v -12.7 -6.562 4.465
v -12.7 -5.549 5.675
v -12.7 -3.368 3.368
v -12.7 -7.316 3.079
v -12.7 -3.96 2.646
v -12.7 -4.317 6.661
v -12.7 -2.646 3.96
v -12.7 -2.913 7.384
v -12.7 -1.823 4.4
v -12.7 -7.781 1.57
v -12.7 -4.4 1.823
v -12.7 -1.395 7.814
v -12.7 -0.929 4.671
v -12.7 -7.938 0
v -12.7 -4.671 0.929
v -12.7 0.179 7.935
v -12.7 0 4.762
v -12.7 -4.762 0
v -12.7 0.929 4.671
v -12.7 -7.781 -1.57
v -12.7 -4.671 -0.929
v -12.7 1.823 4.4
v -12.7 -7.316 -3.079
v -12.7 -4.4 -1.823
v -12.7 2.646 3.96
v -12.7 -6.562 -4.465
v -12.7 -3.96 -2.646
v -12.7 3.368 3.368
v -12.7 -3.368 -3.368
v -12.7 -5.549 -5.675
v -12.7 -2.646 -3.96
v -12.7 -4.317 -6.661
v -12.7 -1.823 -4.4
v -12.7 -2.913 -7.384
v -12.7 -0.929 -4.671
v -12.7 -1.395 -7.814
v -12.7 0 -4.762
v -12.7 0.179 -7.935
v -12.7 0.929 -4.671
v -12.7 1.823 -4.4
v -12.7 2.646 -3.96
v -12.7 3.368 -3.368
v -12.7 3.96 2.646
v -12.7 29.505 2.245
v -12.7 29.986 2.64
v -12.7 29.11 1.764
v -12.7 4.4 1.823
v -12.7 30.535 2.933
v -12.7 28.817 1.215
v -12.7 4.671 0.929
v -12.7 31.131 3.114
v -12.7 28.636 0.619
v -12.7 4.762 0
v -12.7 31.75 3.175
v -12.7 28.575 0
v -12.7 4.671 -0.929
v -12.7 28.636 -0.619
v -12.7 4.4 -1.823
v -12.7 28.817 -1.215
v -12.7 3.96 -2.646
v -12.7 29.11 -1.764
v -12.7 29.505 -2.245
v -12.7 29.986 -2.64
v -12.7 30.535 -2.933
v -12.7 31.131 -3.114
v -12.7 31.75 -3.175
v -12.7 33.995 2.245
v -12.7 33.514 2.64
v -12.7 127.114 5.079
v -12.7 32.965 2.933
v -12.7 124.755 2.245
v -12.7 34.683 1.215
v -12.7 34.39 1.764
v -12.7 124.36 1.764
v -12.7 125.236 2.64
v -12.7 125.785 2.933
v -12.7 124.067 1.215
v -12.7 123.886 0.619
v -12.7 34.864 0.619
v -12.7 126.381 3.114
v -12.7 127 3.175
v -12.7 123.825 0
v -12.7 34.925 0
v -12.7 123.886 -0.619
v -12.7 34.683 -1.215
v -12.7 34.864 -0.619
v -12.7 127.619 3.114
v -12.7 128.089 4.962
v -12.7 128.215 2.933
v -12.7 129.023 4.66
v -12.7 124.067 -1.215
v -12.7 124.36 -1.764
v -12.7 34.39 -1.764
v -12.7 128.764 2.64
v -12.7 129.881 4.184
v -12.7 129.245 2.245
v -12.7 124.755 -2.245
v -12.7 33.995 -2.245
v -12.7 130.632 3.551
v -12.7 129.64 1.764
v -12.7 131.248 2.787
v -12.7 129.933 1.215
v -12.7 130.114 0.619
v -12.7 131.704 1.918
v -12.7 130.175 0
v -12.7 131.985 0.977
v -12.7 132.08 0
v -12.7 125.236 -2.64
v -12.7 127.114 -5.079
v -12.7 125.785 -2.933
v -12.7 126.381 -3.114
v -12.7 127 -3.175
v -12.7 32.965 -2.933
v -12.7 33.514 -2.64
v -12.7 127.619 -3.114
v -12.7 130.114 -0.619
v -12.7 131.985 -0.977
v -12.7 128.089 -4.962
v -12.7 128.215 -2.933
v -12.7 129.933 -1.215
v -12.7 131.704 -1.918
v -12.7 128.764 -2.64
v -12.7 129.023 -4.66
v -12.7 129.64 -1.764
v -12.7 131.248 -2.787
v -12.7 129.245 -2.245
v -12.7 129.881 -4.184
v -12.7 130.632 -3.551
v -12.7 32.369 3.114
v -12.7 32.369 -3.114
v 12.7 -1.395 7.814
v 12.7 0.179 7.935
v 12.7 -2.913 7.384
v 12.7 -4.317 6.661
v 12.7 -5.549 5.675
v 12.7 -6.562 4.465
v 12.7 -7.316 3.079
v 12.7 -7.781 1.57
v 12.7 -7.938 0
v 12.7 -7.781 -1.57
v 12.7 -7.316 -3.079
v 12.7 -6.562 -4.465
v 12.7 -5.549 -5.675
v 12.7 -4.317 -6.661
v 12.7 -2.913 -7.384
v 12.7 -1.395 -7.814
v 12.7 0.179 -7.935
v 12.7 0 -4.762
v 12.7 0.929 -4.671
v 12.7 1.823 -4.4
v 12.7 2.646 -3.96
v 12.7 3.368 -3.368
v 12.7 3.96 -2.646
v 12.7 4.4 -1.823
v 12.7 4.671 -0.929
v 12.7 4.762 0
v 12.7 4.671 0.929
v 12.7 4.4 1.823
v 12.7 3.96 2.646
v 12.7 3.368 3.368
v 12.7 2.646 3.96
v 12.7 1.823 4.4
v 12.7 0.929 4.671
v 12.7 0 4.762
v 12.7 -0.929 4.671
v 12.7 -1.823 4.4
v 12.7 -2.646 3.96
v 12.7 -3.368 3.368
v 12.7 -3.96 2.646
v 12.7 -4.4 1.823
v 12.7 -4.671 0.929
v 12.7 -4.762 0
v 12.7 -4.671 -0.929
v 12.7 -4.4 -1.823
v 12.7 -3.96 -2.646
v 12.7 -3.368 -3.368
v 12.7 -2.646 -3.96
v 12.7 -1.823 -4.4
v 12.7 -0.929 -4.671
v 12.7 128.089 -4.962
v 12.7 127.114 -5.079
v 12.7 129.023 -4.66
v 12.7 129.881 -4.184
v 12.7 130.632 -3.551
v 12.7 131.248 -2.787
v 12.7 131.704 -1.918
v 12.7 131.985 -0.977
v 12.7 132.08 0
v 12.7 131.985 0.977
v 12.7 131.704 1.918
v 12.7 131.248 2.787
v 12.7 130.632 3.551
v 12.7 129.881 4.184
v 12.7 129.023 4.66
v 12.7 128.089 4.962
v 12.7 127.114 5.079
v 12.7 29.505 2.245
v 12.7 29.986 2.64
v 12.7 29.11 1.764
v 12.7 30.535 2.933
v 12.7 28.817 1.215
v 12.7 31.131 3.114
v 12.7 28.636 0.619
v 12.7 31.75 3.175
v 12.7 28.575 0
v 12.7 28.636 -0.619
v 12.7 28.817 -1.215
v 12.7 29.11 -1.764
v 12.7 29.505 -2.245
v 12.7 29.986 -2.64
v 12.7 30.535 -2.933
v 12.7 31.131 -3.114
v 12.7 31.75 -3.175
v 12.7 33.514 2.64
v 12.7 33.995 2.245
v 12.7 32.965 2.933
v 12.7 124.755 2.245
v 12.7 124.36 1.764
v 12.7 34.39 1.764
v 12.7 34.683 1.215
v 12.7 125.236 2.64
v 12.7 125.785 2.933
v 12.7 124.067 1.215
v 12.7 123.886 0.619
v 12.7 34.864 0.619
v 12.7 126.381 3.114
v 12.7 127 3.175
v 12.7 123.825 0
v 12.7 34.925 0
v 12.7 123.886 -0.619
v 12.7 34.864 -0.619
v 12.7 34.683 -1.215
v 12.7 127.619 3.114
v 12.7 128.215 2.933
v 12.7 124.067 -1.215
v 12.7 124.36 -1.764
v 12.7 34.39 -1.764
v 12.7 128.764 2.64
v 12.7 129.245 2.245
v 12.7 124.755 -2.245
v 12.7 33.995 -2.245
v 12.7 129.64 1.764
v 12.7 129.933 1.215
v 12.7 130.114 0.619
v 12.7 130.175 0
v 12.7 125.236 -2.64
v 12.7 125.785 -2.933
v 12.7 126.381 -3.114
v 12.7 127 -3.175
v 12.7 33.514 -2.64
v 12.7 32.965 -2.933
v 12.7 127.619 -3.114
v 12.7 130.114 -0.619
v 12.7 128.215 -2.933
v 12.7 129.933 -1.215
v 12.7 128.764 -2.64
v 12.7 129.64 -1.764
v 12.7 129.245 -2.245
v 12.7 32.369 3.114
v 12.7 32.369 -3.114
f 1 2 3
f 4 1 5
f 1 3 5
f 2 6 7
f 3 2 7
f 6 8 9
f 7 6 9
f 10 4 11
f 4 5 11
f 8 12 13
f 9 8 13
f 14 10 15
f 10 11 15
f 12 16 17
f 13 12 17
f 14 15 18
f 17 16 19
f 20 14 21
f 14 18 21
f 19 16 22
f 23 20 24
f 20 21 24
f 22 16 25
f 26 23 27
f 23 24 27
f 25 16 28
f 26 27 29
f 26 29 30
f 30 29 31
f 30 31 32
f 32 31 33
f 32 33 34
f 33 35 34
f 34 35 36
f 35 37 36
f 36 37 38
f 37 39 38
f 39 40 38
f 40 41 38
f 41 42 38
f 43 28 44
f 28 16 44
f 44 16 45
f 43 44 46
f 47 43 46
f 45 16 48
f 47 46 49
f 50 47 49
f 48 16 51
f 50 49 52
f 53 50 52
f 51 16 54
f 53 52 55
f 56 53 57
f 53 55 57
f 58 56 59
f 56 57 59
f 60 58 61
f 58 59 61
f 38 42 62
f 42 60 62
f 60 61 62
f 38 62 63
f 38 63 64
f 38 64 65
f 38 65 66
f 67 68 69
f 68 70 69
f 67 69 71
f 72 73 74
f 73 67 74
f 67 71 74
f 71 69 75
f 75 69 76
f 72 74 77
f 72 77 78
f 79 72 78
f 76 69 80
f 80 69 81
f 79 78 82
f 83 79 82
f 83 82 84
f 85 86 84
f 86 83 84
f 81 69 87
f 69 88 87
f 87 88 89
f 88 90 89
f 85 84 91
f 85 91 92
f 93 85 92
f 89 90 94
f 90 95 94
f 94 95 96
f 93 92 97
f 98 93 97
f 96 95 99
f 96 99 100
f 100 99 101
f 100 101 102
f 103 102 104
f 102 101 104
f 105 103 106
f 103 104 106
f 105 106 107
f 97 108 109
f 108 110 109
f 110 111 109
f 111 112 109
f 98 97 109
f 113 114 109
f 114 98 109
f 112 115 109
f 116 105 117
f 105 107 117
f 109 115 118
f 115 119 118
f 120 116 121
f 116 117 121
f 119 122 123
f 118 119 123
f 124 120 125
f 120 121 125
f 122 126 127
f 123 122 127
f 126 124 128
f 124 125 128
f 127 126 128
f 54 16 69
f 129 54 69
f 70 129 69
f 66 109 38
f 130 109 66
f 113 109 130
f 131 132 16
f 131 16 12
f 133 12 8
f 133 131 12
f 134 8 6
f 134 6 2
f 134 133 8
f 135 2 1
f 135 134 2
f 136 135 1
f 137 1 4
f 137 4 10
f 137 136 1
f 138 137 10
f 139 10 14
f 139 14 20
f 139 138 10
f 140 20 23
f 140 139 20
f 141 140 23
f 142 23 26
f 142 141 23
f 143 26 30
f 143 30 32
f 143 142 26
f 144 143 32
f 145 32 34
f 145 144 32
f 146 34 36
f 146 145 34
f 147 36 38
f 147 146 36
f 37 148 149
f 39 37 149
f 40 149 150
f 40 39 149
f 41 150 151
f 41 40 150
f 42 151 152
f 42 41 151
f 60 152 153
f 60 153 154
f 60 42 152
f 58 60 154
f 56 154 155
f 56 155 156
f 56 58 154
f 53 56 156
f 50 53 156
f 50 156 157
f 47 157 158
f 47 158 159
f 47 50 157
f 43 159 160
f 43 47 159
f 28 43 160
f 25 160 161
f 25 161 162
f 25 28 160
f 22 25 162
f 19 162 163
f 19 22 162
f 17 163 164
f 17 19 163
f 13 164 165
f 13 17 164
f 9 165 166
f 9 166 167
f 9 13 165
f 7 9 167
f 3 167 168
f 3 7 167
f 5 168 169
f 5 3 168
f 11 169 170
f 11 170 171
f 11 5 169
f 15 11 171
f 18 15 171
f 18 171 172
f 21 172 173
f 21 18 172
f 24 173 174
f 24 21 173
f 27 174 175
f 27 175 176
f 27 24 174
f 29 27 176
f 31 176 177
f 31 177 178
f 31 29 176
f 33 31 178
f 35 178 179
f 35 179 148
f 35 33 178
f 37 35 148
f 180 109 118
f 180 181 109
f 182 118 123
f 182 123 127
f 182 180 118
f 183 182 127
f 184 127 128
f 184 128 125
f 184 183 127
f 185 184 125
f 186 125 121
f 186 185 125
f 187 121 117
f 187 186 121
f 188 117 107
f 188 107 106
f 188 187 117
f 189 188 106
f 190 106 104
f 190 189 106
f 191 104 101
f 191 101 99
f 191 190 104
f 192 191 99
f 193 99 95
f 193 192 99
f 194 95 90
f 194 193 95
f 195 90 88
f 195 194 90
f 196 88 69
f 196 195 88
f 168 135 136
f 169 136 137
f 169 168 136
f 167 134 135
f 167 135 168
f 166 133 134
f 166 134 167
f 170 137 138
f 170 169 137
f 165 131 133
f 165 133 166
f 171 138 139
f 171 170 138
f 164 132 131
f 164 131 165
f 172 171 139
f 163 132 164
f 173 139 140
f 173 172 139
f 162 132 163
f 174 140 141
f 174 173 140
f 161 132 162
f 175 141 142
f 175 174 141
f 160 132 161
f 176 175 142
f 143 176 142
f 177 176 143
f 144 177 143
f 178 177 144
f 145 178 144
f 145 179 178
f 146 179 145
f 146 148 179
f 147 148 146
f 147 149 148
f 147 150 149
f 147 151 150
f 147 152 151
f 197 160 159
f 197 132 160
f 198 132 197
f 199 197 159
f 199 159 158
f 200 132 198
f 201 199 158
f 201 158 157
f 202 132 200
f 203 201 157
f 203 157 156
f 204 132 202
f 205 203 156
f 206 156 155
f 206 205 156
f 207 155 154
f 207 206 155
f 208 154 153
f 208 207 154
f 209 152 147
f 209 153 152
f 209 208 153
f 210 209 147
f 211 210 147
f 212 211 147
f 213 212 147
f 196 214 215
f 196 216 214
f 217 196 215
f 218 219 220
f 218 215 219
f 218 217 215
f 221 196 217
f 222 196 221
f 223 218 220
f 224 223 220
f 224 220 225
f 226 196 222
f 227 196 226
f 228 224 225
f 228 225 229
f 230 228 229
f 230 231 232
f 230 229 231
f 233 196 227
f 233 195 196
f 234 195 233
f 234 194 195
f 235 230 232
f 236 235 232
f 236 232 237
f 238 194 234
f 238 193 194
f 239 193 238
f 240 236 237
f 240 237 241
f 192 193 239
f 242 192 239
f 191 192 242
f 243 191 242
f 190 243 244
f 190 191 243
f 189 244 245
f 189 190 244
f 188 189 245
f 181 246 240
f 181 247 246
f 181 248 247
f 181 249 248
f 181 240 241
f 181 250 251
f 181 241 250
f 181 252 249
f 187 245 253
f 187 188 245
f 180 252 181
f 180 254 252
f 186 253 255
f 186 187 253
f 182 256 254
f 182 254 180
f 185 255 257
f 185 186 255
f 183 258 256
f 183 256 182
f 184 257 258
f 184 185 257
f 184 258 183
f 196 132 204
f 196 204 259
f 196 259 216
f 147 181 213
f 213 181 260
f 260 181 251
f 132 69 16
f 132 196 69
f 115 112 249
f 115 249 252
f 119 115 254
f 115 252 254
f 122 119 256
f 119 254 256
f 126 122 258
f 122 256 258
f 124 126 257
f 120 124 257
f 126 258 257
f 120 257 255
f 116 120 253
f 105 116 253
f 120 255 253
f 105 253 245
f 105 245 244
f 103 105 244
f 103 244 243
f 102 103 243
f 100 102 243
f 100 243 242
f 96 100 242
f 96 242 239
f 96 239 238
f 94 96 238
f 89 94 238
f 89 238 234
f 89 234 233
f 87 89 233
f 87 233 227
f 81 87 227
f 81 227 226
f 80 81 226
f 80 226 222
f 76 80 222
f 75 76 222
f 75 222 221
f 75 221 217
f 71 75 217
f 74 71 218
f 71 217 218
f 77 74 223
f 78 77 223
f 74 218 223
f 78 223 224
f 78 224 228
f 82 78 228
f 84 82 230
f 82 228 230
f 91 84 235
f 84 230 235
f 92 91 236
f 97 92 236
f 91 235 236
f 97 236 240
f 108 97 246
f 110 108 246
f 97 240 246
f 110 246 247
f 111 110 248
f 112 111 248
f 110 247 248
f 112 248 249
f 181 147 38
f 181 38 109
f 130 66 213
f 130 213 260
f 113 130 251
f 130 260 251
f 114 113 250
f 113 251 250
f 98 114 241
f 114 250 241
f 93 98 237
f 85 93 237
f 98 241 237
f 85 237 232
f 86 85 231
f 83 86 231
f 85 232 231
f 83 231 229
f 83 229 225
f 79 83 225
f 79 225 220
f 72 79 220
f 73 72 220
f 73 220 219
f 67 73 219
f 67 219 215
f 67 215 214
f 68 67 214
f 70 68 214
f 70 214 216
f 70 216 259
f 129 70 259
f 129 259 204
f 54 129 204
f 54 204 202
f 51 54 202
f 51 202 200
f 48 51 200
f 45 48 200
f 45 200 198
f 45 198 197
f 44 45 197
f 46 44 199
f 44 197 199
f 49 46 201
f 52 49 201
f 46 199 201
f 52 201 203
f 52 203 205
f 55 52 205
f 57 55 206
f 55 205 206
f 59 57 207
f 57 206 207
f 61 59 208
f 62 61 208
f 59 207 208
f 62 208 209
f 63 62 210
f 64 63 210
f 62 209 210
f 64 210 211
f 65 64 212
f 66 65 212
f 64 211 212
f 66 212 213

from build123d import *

# Parameters (mm, degrees)
SKETCH1_R           = 4.7625
BOSS_EXTRUDE1_DEPTH = 12.7
SKETCH2_R           = 3.175
CUT_EXTRUDE1_DEPTH  = 26.4


with BuildPart() as part:
    # Sketch1 → Boss-Extrude1 (new body, symmetric)
    with BuildSketch(Plane(origin=(0, 0, 0), x_dir=(0, 0, -1), z_dir=(1, 0, 0))):
        with BuildLine():
            Line((-5.078713962, 127.1143), (-7.935490566, 0.17859375))
            ThreePointArc((-7.935490566, 0.17859375), (0, -7.9375), (7.935490566, 0.17859375))
            Line((7.935490566, 0.17859375), (5.078713962, 127.1143))
            ThreePointArc((5.078713962, 127.1143), (0, 132.08), (-5.078713962, 127.1143))
        make_face()
        Circle(SKETCH1_R, mode=Mode.SUBTRACT)
    extrude(amount=BOSS_EXTRUDE1_DEPTH, both=True)

    # Sketch2 → Cut-Extrude1 (cut, through all)
    with BuildSketch(Plane(origin=(12.7, 0, 0), x_dir=(0, 0, -1), z_dir=(1, 0, 0))):
        with Locations((0, 31.75)):
            Circle(SKETCH2_R)
        with Locations((0, 127)):
            Circle(SKETCH2_R)
    extrude(amount=-CUT_EXTRUDE1_DEPTH, mode=Mode.SUBTRACT)


solid = part.part
